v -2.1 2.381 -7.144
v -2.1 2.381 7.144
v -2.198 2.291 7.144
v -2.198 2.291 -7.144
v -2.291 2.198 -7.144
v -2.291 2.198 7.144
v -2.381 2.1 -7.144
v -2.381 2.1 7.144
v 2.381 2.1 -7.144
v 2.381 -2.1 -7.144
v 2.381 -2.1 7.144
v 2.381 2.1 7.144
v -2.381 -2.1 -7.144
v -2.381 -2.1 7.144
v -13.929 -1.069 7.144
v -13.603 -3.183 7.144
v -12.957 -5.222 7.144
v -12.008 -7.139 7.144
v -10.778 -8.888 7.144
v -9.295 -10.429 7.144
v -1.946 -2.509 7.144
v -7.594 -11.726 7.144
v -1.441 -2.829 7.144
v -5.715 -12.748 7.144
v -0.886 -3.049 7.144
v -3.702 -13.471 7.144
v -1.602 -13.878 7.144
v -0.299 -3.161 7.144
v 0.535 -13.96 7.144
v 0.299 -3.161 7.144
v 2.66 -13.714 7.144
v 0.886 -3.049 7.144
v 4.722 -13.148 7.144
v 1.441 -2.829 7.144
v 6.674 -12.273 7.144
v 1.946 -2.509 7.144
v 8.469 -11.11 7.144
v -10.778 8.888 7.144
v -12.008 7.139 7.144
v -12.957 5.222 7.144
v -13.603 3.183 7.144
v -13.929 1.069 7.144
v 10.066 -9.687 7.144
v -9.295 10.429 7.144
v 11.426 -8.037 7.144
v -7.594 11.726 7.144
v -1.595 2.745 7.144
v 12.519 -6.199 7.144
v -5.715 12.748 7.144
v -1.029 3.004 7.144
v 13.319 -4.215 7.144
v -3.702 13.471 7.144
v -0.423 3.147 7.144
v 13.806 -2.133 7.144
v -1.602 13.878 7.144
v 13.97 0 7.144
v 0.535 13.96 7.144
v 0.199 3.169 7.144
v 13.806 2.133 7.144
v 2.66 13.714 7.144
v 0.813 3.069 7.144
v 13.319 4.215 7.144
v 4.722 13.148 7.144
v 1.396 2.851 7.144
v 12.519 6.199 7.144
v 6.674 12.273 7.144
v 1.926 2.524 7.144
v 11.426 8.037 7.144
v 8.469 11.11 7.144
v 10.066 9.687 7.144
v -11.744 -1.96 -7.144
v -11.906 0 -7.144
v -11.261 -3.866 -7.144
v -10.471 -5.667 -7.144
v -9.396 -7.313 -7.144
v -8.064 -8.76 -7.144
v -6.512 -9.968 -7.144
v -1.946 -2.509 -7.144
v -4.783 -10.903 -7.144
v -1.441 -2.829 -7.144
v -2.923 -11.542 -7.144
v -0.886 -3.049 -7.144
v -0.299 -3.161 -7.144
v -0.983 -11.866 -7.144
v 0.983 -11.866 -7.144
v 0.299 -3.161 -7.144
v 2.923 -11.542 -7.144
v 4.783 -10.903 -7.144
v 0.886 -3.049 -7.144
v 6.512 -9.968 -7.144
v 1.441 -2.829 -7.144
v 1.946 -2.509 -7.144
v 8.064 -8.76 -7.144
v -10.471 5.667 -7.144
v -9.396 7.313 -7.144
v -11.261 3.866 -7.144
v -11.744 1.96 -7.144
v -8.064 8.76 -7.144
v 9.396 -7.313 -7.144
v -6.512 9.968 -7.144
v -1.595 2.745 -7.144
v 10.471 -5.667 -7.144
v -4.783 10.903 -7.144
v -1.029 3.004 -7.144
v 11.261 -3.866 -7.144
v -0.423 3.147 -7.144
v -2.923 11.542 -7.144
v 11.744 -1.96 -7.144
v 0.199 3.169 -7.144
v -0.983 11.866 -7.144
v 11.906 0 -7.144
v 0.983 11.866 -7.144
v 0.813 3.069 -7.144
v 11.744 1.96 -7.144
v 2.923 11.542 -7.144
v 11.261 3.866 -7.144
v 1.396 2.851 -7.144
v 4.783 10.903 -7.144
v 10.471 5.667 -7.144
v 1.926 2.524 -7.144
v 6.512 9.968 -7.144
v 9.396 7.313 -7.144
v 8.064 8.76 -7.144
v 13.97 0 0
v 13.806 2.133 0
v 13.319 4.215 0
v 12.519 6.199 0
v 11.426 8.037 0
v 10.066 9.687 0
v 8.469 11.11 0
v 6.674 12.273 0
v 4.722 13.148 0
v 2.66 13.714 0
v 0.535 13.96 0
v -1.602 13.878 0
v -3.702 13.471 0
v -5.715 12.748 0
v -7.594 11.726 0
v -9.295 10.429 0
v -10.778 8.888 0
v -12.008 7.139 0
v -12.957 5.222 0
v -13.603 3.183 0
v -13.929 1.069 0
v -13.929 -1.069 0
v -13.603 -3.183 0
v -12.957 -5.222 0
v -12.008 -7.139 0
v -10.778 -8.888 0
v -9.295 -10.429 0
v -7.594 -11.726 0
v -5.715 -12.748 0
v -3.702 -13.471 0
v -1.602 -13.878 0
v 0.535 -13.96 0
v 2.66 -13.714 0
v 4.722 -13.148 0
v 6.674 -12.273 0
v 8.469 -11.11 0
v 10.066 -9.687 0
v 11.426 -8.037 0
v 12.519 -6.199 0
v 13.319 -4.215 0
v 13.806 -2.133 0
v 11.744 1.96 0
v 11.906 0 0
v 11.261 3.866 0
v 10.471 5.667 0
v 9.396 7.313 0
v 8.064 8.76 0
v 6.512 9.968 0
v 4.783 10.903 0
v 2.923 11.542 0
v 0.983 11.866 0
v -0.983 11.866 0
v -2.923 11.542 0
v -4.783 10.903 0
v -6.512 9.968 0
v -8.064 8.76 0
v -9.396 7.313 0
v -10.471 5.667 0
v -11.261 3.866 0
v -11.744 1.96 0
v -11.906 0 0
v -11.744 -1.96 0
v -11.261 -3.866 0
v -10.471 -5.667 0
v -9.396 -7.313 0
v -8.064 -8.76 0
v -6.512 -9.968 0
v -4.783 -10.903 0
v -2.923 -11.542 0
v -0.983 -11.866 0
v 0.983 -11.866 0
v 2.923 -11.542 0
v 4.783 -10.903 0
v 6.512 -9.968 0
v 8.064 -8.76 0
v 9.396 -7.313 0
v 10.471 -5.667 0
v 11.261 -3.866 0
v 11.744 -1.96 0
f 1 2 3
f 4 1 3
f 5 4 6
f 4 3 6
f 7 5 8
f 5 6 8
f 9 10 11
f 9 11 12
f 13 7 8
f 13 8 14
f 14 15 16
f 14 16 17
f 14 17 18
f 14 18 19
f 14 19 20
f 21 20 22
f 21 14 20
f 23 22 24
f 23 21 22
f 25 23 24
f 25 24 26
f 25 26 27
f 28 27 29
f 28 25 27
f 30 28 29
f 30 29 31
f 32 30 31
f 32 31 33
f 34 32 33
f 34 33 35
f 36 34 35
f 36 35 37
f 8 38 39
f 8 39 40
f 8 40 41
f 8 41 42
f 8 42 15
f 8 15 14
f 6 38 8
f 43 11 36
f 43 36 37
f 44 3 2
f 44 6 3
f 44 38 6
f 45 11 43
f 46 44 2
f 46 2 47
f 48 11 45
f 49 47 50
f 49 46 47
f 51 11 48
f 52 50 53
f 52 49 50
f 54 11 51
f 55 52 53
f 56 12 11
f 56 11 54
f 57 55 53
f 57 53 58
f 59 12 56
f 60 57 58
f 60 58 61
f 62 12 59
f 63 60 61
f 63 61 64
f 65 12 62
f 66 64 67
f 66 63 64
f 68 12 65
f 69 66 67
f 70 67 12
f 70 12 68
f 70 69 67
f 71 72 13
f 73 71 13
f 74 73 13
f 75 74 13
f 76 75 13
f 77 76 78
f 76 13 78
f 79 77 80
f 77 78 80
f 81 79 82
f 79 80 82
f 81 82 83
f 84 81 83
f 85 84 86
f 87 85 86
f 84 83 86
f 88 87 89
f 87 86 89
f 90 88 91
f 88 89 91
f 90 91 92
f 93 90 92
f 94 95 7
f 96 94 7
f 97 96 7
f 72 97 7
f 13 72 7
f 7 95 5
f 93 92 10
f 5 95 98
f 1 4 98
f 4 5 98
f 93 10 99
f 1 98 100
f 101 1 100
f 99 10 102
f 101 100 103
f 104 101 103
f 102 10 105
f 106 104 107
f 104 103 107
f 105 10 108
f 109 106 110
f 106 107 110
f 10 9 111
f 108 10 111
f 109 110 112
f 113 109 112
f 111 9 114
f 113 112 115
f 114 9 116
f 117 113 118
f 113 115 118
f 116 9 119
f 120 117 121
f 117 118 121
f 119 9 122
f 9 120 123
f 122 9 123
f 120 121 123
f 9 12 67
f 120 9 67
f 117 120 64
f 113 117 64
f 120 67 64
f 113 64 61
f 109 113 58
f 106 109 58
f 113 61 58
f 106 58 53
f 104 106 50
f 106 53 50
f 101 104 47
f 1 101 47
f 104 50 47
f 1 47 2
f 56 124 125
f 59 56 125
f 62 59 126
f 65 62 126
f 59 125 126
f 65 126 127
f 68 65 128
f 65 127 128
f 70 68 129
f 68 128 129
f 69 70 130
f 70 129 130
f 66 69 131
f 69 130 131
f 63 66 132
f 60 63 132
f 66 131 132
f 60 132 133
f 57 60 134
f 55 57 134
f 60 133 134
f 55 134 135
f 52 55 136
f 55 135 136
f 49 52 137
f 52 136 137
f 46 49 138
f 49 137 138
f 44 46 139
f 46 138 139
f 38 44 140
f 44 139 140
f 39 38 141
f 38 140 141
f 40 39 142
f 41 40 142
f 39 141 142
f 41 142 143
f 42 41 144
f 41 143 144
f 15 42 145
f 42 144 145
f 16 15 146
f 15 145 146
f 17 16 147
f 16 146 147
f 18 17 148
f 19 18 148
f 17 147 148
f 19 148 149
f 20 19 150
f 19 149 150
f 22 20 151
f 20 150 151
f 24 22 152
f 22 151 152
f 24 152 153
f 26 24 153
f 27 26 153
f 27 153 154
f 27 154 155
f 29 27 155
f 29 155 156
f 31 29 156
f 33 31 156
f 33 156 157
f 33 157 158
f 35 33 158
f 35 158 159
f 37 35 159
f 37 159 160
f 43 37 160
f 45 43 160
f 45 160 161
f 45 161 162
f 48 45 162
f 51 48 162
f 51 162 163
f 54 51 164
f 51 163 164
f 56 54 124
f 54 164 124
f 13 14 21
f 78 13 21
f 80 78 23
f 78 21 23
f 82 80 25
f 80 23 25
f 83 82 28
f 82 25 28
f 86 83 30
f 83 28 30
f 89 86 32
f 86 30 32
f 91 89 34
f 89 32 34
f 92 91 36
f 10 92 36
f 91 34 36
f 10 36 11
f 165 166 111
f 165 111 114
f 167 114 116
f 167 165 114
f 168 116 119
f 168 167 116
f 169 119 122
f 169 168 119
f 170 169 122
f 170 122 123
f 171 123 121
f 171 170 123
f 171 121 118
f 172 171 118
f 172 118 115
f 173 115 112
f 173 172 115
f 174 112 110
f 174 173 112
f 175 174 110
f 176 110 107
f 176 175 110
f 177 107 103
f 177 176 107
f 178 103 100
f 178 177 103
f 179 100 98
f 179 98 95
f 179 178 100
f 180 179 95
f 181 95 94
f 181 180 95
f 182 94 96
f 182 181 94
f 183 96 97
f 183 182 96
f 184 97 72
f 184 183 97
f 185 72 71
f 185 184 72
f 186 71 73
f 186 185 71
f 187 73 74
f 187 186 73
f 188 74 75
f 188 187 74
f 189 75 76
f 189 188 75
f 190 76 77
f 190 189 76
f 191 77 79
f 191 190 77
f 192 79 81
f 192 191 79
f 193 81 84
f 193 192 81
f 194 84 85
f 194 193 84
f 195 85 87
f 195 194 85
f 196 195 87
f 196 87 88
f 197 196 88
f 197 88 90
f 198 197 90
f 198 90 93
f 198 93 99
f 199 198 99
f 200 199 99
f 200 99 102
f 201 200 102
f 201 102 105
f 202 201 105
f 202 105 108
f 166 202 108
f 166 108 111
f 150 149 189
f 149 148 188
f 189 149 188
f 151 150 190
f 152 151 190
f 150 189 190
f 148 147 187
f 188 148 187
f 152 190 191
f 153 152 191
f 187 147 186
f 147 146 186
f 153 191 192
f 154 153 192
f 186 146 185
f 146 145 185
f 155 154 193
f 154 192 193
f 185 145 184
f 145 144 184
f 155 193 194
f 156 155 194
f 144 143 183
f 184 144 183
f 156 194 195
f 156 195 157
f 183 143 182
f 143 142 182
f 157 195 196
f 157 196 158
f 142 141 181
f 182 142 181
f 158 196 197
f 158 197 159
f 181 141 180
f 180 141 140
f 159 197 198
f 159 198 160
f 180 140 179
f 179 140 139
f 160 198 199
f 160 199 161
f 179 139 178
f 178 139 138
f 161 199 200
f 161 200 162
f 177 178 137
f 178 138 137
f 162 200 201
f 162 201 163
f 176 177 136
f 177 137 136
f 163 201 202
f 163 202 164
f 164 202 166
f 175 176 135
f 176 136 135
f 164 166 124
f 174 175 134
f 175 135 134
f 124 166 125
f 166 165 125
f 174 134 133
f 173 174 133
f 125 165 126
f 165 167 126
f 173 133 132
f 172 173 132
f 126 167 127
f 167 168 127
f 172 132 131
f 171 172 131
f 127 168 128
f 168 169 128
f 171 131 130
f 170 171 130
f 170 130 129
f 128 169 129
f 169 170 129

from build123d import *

# Parameters (mm, degrees)
F0_R     = 11.90625
F1_DEPTH = 7.14375
F2_R     = 13.97
F3_DEPTH = 7.14375
F5_DEPTH = 25.4


with BuildPart() as f1:
    # F0 (on Top) → F1 (new body)
    with BuildSketch(Plane.XY):
        Circle(F0_R)
    extrude(amount=-F1_DEPTH)

    # F2 (on Top) → F3 (join)
    with BuildSketch(Plane.XY):
        Circle(F2_R)
    extrude(amount=F3_DEPTH)

    # F4 (on face) → F5 (cut)
    with BuildSketch(Plane.XY.offset(7.14375)):
        with BuildLine():
            ThreePointArc((2.38125, 2.100065), (0.198828, 3.168768), (-2.100065, 2.38125))
            ThreePointArc((-2.100065, 2.38125), (-2.245064, 2.245064), (-2.38125, 2.100065))
            Line((-2.38125, 2.100065), (-2.38125, -2.100065))
            ThreePointArc((-2.38125, -2.100065), (0, -3.175), (2.38125, -2.100065))
            Line((2.38125, -2.100065), (2.38125, 2.100065))
        make_face()
    extrude(amount=-F5_DEPTH, mode=Mode.SUBTRACT)


solid = f1.part
